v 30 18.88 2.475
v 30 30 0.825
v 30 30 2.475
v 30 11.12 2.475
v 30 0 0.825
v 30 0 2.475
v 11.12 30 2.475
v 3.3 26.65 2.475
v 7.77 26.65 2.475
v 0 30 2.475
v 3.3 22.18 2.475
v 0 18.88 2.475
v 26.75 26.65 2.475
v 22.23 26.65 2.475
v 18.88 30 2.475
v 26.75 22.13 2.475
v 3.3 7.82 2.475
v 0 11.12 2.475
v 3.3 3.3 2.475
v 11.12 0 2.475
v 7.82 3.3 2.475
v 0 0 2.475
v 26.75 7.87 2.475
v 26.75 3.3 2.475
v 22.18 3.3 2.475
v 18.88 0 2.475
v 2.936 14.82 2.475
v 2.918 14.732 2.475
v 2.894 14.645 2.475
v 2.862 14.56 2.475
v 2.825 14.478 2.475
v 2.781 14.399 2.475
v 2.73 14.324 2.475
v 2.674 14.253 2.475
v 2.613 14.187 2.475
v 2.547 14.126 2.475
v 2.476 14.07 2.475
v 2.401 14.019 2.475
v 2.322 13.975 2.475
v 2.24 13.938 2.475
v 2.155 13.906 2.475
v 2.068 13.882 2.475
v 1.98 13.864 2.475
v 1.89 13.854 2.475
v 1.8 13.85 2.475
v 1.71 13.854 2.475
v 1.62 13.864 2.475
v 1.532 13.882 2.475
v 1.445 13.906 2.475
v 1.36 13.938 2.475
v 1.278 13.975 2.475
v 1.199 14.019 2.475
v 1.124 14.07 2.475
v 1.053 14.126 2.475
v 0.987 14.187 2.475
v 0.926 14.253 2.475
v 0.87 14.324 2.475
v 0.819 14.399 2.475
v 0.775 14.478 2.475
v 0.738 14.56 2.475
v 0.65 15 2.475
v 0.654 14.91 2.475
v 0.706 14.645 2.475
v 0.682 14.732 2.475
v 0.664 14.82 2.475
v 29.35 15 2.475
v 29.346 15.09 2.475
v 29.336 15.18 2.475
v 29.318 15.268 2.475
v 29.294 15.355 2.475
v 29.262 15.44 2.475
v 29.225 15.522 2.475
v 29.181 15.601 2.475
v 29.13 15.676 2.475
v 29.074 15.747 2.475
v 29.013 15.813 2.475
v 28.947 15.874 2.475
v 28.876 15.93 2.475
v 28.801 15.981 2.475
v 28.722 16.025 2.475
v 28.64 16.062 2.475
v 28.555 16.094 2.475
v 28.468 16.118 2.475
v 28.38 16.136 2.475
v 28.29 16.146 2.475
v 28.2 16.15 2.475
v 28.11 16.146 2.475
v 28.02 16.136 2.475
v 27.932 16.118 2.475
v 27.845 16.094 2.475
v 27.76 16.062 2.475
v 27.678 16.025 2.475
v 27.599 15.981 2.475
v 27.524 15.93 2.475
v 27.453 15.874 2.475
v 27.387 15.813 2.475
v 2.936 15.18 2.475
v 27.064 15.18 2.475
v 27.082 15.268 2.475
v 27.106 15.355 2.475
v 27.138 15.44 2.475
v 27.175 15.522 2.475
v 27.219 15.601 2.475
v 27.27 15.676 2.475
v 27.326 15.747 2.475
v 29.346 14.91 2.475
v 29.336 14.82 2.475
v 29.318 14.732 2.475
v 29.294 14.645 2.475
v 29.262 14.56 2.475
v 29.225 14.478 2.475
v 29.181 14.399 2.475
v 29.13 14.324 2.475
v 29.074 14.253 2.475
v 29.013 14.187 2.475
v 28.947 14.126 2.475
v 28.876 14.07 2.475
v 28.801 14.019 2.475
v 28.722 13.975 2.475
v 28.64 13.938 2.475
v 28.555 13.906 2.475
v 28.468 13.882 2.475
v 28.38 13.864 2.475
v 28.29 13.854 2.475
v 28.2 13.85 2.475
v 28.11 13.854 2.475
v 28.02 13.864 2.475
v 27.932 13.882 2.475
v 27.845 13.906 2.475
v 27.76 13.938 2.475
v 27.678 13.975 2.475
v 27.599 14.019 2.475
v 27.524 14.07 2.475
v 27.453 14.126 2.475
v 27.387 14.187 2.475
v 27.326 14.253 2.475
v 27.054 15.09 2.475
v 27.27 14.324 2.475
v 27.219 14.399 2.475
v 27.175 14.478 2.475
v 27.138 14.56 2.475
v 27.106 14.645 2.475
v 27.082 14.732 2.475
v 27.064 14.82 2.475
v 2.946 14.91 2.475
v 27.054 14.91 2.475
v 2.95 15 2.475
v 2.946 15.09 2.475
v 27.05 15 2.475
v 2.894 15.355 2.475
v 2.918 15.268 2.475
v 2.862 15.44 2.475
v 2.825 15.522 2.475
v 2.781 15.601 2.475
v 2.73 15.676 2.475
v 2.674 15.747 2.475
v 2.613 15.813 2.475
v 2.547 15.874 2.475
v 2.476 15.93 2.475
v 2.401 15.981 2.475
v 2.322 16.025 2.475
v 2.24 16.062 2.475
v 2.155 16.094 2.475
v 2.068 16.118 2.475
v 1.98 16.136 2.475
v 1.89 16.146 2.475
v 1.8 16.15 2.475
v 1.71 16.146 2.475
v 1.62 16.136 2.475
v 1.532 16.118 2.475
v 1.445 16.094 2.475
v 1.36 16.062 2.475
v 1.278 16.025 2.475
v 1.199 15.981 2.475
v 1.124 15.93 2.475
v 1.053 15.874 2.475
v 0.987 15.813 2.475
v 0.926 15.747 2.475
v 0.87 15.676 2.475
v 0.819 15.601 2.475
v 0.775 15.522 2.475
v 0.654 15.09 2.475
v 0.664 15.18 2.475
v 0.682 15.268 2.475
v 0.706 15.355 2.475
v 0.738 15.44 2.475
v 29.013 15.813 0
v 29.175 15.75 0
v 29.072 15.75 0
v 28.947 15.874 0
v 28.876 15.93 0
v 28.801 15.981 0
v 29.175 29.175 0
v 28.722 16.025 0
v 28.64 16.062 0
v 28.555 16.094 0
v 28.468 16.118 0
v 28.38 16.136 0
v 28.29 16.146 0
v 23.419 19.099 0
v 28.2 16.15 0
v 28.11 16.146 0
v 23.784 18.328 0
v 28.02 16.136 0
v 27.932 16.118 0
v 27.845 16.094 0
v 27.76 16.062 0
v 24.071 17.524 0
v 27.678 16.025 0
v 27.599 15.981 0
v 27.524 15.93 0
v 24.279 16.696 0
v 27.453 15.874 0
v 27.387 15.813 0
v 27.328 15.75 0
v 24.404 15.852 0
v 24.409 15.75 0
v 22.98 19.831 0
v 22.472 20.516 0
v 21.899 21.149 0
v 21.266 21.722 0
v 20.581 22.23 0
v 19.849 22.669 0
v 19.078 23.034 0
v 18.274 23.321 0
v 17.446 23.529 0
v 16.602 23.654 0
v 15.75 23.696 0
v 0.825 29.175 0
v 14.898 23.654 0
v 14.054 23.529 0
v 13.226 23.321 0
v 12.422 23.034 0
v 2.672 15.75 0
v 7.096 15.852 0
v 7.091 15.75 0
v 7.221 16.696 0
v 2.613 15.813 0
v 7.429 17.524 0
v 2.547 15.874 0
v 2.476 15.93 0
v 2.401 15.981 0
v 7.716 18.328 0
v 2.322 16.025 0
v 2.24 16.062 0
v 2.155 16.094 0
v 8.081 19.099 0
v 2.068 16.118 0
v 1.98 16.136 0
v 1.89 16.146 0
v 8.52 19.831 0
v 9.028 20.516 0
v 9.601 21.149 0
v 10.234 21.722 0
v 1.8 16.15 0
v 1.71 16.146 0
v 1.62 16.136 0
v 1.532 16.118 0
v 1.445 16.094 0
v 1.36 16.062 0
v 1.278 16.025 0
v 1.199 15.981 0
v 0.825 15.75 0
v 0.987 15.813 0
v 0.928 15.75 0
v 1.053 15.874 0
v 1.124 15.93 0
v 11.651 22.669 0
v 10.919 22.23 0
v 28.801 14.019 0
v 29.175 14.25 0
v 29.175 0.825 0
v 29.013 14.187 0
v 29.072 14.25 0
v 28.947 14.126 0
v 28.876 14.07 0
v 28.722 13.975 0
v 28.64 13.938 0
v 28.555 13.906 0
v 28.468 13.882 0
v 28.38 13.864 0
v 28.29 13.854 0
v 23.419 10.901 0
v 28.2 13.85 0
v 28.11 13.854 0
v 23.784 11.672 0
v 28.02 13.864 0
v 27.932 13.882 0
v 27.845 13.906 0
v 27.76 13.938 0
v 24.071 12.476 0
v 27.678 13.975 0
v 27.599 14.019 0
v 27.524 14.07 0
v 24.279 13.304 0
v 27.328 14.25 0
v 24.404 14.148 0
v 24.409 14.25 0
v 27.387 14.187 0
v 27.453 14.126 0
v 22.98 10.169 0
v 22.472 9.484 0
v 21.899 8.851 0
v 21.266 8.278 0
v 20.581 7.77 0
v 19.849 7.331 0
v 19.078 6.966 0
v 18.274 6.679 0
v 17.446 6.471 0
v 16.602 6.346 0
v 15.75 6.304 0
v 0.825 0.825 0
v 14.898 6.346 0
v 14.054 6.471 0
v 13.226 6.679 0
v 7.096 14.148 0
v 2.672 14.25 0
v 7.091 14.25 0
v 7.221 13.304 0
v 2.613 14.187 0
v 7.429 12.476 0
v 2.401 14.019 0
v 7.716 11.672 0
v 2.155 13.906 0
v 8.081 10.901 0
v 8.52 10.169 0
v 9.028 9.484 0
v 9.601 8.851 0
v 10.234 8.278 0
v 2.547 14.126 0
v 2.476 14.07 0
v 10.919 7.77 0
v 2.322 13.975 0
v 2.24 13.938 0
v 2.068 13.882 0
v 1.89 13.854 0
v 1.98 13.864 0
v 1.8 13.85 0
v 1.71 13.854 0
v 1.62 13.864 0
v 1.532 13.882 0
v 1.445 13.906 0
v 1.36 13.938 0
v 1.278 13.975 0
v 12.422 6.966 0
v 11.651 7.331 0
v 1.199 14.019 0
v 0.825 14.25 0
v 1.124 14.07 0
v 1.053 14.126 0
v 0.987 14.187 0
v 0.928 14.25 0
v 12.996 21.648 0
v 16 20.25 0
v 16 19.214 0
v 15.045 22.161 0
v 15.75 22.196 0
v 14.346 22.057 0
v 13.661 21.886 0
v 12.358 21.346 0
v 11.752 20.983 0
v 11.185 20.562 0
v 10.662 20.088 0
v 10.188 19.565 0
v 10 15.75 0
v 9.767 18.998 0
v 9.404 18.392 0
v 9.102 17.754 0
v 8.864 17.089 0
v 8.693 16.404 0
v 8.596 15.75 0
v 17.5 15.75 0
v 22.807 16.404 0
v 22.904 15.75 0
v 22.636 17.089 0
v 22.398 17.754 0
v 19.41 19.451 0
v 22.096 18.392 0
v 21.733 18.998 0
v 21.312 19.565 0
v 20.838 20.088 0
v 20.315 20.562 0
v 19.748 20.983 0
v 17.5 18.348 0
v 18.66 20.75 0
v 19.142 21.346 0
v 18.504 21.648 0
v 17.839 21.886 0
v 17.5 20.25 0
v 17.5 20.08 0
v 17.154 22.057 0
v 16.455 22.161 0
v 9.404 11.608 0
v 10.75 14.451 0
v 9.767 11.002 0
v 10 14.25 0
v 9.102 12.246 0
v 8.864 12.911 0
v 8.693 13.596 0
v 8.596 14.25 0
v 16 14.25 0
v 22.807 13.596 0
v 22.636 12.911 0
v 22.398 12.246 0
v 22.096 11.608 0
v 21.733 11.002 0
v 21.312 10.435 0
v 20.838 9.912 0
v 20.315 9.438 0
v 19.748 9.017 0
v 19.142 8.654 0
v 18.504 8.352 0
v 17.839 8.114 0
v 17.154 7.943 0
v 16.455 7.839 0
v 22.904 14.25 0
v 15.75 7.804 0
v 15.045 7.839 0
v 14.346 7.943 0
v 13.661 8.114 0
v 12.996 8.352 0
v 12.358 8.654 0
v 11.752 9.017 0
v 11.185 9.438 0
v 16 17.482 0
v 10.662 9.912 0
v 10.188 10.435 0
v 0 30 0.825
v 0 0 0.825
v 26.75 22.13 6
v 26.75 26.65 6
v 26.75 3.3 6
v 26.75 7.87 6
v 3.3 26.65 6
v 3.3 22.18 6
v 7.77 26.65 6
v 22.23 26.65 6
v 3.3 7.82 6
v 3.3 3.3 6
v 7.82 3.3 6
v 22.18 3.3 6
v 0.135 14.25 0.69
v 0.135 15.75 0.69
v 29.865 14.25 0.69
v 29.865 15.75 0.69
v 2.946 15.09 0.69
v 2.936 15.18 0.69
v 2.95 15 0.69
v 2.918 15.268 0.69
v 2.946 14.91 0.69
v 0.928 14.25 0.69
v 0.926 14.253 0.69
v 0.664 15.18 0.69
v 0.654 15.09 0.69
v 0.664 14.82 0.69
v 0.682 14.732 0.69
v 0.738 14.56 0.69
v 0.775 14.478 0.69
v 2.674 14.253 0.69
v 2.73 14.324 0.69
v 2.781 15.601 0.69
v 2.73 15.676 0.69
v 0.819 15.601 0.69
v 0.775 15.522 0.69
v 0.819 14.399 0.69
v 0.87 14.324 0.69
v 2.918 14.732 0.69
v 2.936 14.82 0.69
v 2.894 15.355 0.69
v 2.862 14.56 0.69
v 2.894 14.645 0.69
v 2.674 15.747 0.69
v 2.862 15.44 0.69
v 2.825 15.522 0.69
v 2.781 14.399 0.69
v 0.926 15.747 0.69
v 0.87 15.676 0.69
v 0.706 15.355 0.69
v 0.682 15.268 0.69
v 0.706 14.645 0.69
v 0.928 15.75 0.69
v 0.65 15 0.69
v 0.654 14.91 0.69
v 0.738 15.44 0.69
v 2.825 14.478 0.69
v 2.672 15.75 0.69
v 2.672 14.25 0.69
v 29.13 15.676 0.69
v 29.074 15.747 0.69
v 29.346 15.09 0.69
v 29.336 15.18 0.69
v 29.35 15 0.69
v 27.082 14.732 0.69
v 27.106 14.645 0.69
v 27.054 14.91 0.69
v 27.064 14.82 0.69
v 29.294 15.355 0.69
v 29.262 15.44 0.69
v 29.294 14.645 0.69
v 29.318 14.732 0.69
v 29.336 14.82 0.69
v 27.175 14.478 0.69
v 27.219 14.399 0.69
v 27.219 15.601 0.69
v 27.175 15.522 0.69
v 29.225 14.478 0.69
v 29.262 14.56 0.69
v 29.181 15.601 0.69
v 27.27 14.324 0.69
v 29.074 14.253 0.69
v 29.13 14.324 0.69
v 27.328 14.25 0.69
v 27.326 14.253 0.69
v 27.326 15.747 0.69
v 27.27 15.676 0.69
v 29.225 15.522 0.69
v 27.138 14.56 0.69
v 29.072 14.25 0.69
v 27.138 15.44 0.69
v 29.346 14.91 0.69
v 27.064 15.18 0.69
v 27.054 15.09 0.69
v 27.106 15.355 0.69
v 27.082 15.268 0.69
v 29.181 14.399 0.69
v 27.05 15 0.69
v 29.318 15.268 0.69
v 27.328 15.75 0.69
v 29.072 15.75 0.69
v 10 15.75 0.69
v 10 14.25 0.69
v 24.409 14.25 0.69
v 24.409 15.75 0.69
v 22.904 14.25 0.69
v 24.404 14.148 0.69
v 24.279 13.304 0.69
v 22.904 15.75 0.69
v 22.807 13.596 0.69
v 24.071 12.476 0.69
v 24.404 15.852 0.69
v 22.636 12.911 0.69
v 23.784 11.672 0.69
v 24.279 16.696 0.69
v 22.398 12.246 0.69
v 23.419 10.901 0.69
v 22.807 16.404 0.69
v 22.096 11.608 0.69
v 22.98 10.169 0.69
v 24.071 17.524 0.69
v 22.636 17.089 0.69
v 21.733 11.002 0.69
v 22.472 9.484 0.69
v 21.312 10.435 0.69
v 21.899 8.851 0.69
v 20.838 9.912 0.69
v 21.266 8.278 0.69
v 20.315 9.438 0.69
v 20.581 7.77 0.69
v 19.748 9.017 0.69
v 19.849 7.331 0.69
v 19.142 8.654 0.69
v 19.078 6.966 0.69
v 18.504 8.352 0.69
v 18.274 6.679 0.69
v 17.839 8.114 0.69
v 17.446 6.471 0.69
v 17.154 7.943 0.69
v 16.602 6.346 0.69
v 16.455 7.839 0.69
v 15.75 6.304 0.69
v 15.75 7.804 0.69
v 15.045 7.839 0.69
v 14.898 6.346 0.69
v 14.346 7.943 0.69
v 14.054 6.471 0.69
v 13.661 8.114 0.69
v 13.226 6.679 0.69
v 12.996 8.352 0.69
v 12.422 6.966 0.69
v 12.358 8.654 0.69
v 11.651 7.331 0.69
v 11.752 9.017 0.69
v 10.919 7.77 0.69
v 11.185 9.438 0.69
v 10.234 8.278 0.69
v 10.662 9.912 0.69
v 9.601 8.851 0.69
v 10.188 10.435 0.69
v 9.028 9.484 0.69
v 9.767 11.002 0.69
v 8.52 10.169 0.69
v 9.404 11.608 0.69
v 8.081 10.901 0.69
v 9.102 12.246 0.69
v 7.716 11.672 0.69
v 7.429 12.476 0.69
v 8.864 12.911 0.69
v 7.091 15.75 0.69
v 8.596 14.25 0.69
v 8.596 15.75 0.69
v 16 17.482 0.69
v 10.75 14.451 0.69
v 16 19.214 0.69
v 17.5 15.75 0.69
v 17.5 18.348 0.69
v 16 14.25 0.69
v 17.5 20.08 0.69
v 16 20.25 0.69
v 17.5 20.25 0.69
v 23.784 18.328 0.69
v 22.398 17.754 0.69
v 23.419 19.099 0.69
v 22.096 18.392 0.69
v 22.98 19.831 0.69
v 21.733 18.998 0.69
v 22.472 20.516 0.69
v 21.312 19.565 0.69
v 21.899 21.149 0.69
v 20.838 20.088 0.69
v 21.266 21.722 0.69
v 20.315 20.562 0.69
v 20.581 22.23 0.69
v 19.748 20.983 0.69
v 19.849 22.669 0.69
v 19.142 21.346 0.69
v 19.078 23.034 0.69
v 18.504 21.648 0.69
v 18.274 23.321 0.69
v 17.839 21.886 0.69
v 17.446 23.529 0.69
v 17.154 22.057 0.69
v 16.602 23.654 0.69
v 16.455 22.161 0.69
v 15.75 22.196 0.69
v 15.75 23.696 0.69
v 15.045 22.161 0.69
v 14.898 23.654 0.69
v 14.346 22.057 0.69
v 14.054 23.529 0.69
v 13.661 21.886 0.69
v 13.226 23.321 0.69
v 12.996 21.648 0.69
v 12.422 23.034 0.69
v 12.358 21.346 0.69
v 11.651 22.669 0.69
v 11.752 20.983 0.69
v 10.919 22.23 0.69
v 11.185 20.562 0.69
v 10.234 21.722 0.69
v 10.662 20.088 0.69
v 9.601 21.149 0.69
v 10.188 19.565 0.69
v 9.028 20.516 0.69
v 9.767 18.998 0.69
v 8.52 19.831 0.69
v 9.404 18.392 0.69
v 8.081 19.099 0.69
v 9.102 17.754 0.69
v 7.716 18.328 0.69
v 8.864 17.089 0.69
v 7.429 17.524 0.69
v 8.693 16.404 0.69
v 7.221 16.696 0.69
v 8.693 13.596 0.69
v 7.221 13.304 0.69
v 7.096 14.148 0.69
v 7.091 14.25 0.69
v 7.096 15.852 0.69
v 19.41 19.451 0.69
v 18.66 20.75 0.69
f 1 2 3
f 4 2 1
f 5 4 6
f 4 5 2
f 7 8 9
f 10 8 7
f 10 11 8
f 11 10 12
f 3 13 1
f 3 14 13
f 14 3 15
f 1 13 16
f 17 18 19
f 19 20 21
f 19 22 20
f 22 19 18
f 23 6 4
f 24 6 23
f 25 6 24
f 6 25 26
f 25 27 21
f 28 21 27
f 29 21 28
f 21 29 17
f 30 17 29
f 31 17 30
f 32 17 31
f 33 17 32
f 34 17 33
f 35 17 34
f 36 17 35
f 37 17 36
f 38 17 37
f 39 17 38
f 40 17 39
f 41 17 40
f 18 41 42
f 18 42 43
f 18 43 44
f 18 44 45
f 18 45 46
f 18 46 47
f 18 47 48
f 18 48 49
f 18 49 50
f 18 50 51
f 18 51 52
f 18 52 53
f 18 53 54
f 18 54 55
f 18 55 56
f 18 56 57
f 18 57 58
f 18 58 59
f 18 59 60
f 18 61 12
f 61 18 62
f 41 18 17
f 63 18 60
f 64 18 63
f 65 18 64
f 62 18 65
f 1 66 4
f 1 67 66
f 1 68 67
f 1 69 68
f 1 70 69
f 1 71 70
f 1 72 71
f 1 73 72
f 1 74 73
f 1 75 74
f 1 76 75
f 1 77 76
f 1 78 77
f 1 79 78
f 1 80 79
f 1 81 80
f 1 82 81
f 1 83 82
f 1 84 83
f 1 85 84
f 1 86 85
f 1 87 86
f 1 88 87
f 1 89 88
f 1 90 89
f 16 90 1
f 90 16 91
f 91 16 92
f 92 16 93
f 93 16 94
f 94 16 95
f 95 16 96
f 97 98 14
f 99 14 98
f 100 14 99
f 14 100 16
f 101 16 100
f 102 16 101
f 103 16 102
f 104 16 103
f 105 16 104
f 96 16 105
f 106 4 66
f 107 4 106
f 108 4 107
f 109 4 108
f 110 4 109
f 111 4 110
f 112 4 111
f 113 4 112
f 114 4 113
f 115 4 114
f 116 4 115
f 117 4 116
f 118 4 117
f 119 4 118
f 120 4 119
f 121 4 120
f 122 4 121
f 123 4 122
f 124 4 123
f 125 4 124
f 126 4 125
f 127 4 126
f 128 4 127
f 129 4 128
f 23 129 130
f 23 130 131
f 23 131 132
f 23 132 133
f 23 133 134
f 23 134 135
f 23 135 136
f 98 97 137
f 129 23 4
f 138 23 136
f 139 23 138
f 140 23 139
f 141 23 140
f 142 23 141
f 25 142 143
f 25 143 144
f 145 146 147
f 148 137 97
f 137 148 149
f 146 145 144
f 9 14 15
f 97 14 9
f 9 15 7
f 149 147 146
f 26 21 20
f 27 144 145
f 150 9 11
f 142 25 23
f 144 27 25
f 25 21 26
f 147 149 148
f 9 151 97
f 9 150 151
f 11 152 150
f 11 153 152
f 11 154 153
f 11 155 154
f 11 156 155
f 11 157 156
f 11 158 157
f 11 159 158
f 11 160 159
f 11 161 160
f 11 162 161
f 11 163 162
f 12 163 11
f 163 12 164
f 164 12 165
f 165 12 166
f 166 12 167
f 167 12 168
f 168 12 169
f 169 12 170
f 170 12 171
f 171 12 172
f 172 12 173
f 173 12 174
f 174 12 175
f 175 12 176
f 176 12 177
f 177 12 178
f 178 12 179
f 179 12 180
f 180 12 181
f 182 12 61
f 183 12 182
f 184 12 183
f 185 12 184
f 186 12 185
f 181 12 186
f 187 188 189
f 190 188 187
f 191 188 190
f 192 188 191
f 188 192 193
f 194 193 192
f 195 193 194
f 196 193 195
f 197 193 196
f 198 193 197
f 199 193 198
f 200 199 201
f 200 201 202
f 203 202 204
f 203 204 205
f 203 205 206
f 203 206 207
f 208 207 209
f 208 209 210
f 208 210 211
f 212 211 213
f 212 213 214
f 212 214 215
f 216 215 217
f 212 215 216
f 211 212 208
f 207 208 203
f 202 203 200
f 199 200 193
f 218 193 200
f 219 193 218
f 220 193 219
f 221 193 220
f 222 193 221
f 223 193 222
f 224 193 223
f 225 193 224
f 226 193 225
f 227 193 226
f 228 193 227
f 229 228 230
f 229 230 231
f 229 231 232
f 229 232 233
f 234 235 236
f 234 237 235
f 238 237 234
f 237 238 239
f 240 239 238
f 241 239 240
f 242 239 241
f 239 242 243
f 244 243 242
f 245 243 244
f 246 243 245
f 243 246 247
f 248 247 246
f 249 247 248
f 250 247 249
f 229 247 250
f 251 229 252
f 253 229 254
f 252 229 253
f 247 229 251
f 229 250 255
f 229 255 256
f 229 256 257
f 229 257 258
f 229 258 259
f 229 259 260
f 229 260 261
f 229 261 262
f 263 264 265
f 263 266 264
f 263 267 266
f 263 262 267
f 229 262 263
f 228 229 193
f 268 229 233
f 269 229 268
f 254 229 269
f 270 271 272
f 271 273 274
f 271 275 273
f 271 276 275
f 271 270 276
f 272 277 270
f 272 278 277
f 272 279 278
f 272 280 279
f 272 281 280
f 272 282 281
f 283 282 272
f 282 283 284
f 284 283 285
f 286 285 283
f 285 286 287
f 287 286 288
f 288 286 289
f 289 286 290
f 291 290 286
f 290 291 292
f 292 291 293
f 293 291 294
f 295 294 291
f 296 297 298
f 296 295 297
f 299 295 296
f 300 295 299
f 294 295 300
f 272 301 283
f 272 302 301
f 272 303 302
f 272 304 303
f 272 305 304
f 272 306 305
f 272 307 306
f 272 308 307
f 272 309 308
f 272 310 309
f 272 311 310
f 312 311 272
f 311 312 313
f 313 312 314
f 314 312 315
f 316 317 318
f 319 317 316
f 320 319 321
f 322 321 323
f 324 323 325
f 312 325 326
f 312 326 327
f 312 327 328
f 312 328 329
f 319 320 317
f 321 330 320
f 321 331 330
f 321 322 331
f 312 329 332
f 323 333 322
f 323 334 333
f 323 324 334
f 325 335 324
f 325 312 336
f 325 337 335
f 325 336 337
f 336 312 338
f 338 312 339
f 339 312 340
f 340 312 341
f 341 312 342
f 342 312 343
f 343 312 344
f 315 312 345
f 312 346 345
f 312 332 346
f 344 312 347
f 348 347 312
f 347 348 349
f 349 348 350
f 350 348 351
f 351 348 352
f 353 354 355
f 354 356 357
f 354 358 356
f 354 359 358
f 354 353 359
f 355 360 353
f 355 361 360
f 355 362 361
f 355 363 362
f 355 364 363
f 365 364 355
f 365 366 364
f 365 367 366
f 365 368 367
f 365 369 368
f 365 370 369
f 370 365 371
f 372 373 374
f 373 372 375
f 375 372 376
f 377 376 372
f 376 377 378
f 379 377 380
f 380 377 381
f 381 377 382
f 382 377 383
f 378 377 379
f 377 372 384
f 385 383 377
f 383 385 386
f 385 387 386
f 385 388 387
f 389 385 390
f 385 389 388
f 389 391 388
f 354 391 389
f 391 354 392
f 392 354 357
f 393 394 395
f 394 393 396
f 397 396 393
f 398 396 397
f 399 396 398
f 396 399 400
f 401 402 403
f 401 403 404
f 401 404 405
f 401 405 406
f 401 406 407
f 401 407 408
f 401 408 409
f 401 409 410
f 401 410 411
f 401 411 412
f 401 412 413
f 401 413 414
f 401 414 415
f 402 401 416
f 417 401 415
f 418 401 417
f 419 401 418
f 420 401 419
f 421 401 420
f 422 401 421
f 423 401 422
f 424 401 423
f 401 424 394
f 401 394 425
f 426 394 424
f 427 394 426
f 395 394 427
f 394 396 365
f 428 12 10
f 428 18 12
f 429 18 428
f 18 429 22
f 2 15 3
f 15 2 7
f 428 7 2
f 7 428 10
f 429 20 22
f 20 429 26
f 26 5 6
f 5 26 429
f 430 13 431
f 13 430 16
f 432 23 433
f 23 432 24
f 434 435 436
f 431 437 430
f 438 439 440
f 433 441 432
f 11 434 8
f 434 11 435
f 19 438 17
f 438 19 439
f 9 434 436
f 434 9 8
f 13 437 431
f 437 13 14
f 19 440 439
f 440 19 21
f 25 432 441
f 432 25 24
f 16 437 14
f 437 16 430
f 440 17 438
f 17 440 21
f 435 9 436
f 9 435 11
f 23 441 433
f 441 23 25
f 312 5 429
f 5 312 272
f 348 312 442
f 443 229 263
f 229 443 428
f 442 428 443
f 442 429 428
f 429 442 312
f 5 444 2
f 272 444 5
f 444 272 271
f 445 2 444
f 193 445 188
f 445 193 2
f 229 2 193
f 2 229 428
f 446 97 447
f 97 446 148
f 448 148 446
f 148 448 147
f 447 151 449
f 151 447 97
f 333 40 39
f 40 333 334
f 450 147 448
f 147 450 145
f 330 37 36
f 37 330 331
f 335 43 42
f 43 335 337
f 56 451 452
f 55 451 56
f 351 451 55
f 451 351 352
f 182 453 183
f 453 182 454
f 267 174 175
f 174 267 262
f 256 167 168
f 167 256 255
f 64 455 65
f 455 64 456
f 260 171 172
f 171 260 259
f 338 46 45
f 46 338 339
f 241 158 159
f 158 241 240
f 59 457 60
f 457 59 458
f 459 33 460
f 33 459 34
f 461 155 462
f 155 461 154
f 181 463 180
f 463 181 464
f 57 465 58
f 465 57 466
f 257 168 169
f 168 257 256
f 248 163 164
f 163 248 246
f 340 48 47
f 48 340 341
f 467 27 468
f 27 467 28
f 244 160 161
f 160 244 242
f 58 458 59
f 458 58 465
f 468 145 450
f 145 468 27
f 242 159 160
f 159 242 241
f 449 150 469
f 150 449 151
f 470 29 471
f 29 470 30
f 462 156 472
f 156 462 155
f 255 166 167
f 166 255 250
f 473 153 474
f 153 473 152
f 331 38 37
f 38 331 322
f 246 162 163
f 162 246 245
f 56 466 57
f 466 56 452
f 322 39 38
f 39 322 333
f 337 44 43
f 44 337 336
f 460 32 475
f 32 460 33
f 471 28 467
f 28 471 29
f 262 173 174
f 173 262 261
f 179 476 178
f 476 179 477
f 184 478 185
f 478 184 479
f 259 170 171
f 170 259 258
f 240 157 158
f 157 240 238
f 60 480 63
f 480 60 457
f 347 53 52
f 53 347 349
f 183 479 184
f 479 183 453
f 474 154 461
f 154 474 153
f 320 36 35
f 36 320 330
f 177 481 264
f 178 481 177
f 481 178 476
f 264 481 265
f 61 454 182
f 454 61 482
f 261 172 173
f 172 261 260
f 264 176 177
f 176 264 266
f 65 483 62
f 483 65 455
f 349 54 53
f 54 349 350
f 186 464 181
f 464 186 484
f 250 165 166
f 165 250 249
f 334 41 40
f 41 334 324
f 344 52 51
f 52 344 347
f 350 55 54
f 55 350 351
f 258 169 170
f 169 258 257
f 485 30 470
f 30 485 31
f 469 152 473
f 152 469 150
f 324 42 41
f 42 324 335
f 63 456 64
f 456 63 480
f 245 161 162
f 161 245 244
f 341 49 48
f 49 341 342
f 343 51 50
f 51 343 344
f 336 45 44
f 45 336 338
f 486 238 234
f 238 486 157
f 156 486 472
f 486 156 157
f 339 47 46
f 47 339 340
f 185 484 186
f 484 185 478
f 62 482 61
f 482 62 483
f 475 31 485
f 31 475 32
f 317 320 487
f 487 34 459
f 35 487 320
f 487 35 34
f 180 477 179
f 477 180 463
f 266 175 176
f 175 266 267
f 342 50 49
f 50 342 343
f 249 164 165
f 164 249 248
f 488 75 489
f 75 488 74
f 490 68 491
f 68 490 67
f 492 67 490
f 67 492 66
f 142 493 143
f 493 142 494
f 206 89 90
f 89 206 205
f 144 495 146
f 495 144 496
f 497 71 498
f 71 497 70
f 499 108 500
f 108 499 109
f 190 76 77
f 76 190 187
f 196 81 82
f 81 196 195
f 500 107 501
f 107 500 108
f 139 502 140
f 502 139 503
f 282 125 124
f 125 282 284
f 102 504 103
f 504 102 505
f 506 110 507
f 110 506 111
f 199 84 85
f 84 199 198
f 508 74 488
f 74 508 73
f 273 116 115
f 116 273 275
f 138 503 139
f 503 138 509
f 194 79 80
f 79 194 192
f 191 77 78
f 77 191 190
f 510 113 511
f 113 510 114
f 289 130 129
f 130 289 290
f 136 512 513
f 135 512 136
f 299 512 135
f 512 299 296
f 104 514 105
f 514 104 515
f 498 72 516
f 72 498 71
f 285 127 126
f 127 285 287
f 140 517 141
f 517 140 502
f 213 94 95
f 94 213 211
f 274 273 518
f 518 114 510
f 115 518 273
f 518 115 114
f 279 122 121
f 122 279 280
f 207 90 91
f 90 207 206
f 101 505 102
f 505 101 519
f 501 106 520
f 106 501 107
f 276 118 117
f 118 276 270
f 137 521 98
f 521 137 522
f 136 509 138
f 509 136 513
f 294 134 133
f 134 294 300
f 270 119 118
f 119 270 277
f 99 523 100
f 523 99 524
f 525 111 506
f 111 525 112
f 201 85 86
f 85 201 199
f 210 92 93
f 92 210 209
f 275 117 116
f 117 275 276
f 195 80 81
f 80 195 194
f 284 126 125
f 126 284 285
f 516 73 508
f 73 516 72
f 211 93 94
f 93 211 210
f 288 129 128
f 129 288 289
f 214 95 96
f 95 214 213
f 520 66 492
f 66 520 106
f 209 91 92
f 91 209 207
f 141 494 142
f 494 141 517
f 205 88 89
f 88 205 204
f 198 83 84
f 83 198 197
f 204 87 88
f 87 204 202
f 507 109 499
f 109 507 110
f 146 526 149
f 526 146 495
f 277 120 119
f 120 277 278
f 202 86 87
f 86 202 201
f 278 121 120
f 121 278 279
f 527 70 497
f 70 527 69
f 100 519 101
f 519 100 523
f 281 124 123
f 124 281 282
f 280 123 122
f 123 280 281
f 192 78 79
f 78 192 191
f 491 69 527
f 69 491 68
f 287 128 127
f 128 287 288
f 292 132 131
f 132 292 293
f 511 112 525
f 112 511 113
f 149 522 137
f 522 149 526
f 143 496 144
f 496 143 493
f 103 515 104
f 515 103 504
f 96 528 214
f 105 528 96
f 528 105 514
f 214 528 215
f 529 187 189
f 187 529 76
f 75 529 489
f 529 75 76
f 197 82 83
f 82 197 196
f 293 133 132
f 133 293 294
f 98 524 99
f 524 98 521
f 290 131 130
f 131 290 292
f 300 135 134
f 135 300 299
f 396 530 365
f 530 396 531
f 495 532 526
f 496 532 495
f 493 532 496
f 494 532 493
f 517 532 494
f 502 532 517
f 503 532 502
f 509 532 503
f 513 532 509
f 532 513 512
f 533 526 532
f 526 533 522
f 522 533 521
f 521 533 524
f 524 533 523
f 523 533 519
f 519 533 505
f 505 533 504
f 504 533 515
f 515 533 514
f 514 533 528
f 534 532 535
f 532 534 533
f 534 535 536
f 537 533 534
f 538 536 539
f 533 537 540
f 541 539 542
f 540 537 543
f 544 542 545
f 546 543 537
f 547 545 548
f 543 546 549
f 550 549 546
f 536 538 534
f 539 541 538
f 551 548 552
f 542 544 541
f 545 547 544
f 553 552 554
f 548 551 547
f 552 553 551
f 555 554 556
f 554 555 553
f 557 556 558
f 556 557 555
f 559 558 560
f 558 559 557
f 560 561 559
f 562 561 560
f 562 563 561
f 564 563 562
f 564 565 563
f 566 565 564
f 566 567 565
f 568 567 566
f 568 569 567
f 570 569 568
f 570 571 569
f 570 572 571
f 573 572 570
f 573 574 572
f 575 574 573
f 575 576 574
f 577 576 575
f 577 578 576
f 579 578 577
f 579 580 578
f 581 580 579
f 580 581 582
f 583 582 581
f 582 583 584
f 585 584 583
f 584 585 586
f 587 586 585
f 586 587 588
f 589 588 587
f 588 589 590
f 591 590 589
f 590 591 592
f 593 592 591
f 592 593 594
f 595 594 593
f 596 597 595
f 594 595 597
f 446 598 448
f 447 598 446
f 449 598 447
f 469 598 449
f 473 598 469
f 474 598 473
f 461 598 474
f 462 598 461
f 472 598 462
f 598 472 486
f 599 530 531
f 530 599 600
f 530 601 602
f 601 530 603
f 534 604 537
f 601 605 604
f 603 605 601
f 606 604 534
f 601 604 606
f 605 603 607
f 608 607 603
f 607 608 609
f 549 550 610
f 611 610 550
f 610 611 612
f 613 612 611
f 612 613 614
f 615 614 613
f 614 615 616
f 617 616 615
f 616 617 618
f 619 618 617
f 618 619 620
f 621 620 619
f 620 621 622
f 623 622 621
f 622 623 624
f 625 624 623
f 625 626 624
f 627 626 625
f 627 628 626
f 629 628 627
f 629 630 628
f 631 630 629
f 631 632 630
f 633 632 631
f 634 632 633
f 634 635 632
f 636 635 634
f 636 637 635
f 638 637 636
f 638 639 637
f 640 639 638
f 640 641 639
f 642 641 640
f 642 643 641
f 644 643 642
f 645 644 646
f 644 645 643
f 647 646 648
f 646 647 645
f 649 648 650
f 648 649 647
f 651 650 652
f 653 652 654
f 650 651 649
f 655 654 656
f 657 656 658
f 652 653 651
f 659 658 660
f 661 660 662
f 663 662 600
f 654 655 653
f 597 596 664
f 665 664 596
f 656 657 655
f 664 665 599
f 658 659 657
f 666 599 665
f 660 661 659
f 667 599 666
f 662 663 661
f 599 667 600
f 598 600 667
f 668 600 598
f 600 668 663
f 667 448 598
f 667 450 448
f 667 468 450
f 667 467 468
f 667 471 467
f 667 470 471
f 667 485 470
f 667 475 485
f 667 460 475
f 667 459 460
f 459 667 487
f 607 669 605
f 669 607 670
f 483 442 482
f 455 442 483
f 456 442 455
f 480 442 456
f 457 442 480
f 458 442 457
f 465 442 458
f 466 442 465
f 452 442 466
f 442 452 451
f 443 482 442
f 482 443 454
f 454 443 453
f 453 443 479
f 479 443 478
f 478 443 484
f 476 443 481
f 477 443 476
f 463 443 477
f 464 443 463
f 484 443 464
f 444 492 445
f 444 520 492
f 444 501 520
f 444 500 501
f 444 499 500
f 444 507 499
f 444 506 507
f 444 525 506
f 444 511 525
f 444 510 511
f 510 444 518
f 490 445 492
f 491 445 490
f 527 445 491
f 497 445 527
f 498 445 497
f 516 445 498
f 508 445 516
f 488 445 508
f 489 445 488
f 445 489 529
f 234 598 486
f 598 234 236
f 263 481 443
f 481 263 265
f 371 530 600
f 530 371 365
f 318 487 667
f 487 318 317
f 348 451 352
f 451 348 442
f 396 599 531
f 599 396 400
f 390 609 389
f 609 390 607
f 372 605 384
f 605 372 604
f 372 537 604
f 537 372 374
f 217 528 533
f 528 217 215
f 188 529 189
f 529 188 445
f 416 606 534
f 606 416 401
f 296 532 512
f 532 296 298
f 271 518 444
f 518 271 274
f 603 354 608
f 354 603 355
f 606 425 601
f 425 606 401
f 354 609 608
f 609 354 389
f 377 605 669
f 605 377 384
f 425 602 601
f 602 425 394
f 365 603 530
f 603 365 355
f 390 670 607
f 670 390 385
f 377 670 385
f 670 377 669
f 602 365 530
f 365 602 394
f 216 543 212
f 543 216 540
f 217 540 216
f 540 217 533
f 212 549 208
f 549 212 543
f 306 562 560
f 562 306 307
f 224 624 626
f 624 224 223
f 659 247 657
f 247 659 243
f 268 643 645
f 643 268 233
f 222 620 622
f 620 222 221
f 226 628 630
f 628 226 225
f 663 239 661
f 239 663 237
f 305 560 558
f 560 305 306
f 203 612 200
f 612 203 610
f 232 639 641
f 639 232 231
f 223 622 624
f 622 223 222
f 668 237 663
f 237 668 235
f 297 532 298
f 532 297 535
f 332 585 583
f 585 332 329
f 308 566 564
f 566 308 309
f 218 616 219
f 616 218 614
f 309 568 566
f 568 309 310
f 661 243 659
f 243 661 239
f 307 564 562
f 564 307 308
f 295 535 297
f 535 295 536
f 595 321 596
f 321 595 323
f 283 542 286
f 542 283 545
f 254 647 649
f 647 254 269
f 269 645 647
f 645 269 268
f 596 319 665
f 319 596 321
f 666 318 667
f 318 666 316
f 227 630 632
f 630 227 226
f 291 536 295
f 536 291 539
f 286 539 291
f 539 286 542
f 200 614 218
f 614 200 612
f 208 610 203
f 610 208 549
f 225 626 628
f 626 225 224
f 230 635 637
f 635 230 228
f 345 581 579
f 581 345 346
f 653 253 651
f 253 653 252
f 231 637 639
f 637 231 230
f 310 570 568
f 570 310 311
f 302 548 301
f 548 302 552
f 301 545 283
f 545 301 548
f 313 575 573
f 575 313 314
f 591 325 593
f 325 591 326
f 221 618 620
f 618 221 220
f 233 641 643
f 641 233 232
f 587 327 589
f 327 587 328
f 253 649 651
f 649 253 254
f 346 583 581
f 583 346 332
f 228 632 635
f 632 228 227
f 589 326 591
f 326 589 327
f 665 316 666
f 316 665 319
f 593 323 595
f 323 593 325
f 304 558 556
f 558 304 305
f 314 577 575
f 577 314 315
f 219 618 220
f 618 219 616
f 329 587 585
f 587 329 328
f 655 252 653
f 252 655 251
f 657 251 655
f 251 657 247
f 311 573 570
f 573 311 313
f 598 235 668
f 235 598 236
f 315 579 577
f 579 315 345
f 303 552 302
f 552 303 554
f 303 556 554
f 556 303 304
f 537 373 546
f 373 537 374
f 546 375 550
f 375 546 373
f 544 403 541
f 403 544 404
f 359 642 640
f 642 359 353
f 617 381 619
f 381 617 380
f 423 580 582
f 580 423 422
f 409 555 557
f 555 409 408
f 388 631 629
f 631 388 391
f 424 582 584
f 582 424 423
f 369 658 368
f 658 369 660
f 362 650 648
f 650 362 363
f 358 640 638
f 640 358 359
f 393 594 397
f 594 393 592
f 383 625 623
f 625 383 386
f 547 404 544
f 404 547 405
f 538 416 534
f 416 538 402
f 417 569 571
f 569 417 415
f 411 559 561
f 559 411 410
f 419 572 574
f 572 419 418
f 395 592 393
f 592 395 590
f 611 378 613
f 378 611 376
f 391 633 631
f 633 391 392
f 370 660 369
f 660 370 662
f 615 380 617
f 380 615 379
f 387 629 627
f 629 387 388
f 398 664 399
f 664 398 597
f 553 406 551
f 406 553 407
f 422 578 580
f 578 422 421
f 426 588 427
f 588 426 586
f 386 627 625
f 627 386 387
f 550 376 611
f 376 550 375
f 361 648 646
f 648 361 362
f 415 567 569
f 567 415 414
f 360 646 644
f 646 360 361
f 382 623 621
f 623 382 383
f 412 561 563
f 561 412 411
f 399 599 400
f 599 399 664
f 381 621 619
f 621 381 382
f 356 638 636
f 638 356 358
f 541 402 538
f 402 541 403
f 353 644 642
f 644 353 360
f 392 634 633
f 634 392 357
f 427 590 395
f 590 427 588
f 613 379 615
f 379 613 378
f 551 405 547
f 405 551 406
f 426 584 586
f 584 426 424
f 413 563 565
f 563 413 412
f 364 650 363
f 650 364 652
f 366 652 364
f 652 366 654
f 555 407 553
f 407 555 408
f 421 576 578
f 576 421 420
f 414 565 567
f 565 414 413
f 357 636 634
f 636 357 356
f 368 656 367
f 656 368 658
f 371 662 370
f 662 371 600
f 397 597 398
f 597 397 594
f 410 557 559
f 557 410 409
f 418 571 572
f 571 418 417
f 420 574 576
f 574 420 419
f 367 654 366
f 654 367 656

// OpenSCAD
// file: sym_switch_nc.scad
// nc = normally closed
module switch_nc(length, width, thickness, height)
{
    translate([0,-thickness/2,0])cube([length/2-width/2, thickness, height]);
    
    translate([(length/2+width/4),-thickness/2,0])cube([(length/2-width/4), thickness, height]);
    
    translate([(length/2+width/4-thickness),-thickness/2,0])cube([thickness, 3*width/5, height]);
    
    translate([(length/2-width/2),+thickness/2, 0])rotate([0,0,-60])cube([thickness, width, height]);
    
}

switch_nc(30, 12, 1, 1);
// file: settings.scad
cube_width=30;
cube_height=16;
cube_thickness=3.3;

cap_width=30;
cap_height=6;
cap_thickness=3.3;

glyph_depth=0.7;
glyph_thickness=1.5;

photo_resitor_hole_r = 2.4;
spring_contact_hole_r = 3.125;
// file: sym_switch_reed_nc.scad
use <sym_switch_nc.scad>

// nc = normally closed
module switch_reed_nc(length, width, thickness, height)
{
    switch_nc(length, width, thickness, height);
    radius = width/1.15;
    translate([2*length/4+thickness/2,0,0]) difference()
    {
        cylinder(r=radius, h=height, $fn=64);
        translate([0,0,-thickness/2])cylinder(r=(radius-thickness), h=(height+thickness), $fn=64);
    }
}

switch_reed_nc(30, 10, 1, 0.5);
// file: cap_1x1.scad
include <settings.scad>

module cap_1x1(width, height, thickness, holes_mask)
{
    width1=width-thickness;
    difference()
    {
        union()
        {
            cube([width, width, thickness*3/4]);
            translate([thickness,thickness,0])cube([width-2*(thickness-0.025), width-2*(thickness+0.025), height]);
        }
        union()
        {
            translate([width/2,width/2,0])rotate([0,0,45])translate([-width1/2,-width1/2,thickness*3/4]) cube([width1,width1,height]);
                        //corners
            translate([0,0.25*thickness,0])rotate([45,0,0]) translate([-0.5*width, -width, -0.5*height]) cube([2*width, width, 2*height]);
            translate([0.25*thickness,0,0]) rotate([0,-45,0]) translate([-width, -0.5*width, -0.5*height]) cube([width, 2*width, 2*height]);
            translate([width-0.25*thickness,0,0]) rotate([0,45,0]) translate([0, 0, -0.5*height]) cube([width, 2*width, 2*height]);
            translate([0,width-0.25*thickness,0]) rotate([-45,0,0]) translate([-0.5*width, 0, -0.5*height]) cube([2*width, width, 2*height]);
            
            if (holes_mask >= 8)
            {
                translate([width/2, thickness-1.5, -0.5]) cylinder(r=1.15, h=height*1.5, $fn=80);
            }
            if ((holes_mask%8) >= 4)
            {
                translate([width/2, width-thickness+1.5, -0.5]) cylinder(r=1.15, h=height*1.5, $fn=80);
            }
            if ((holes_mask%4)>= 2)
            {
                translate([thickness-1.5, width/2, -0.5]) cylinder(r=1.15, h=height*1.5, $fn=80);
            }
            if (holes_mask%2 >= 1)
            {
                translate([width-thickness+1.5, width/2, -0.5]) cylinder(r=1.15, h=height*1.5, $fn=80);
            }
        }
    }
}

cap_1x1(cap_width, cap_height, cap_thickness, 9);
//ring(10,1,1);
//arrow(1, 20, 3, 1);
//transistor_npn(30, 1, 1);
// main file
use <cap_1x1.scad>
use <sym_switch_reed_nc.scad>
include <settings.scad>

// nc = normally closed
module cap_1x1_switch_reed_nc(width, height, thickness)
{
    difference()
    {
        cap_1x1(width, height, thickness, 3);
        translate([0,width/2,-0.01]) switch_reed_nc(width, width/3, glyph_thickness, glyph_depth);
    }
}

cap_1x1_switch_reed_nc(cap_width, cap_height, cap_thickness);
